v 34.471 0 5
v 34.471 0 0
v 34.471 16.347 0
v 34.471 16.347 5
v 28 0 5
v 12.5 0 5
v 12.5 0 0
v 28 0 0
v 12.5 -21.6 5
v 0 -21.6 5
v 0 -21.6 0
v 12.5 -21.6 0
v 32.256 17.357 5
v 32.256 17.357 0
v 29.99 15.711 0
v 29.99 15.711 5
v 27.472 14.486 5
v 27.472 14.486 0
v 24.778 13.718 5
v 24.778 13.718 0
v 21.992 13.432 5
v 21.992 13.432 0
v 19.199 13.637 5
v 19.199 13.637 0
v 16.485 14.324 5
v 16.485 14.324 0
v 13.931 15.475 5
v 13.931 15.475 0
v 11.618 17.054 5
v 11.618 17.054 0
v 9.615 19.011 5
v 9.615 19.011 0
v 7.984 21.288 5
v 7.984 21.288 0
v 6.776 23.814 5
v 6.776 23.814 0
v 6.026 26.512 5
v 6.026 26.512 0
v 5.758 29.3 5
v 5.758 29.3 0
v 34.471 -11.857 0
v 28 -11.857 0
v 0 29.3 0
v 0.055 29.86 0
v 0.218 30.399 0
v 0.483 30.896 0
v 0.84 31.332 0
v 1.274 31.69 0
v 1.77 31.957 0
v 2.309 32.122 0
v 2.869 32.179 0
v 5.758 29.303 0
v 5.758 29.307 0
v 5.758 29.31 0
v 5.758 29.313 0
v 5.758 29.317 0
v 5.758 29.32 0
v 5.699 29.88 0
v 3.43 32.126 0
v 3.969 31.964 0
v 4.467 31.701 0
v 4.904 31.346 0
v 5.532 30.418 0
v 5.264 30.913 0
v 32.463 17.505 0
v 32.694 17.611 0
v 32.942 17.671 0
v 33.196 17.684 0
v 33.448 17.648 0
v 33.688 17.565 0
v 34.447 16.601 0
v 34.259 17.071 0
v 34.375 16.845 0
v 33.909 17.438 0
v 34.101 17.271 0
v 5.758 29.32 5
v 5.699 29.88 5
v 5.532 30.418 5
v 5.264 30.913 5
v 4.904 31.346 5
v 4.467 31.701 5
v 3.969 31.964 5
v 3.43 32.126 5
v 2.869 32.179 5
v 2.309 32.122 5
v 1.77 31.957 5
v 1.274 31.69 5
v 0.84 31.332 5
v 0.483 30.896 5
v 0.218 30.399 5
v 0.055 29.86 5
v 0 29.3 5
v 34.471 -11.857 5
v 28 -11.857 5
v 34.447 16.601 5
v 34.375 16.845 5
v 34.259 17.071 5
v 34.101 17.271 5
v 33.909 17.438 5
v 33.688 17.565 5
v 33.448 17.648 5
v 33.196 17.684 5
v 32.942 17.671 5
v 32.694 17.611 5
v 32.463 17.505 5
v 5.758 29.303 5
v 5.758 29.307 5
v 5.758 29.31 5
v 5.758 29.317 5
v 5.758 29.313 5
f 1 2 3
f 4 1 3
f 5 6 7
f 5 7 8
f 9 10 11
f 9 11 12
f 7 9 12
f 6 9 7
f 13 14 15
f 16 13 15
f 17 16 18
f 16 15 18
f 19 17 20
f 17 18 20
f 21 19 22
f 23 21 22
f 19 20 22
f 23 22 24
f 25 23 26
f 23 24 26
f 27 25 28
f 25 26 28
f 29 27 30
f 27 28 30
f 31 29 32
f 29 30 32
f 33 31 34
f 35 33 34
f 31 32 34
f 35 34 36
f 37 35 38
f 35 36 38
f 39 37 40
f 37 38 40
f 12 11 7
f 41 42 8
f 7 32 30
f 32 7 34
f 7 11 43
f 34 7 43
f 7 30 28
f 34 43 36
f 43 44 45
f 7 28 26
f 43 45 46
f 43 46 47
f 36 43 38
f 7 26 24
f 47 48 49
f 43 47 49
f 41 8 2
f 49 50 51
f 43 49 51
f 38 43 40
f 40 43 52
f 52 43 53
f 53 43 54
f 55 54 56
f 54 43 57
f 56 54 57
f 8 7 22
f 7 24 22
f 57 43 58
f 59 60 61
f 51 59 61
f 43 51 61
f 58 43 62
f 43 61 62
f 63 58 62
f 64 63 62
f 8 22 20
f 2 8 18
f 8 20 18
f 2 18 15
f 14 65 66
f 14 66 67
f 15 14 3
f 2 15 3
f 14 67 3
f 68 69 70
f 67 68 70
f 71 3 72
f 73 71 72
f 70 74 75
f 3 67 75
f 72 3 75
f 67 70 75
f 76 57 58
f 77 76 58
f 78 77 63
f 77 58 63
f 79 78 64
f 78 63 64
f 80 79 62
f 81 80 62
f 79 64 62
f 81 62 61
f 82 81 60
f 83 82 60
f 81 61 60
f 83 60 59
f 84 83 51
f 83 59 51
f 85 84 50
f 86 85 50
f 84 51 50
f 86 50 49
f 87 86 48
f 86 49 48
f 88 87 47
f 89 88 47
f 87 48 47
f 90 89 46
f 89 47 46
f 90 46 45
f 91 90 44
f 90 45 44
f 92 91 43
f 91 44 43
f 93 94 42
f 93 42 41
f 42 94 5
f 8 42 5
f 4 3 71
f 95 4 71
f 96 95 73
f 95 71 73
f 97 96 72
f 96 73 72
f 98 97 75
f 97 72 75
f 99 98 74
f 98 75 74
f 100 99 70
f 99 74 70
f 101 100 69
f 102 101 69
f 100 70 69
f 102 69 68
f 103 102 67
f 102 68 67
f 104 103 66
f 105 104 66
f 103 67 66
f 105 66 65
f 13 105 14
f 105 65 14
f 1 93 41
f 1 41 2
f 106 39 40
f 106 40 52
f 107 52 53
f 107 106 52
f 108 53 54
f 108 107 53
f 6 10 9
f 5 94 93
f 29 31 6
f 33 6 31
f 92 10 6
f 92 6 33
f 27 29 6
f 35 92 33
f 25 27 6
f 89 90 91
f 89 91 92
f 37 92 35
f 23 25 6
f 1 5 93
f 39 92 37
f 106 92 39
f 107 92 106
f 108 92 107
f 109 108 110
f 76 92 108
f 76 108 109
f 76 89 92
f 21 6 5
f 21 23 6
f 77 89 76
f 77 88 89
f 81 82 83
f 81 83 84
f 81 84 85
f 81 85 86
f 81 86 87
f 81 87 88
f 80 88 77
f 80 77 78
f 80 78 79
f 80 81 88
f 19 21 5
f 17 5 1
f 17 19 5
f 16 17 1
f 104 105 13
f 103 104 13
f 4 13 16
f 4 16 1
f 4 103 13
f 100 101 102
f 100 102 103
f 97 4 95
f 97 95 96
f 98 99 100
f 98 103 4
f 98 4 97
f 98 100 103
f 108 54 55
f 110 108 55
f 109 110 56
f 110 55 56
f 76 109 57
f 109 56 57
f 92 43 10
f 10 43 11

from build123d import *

# Parameters (mm, degrees)
F1_DEPTH = 5
F2_W     = 6.4714387385
F2_H     = 11.8567999452
F2_W_2   = 12.5
F2_H_2   = 9.7434073687
F3_DEPTH = 5


# Not quite as in the source:
# - ends of sketch curves that miss each other by under 0.0002 mm in the source are joined
# - a feature names something its author has since deleted; it is built from what else it names


with BuildPart() as f1:
    # F0 (on Top) → F1 (new body)
    with BuildSketch(Plane.XY):
        with BuildLine():
            Line((0, 29.2999204248), (0, 0))
            Line((0, 0), (34.4714387385, 0))
            Line((34.4714387385, 0), (34.4714387385, 16.3473710418))
            ThreePointArc((34.4714387385, 16.3473710418), (32.5790927131, 15.1300794804), (32.2559916738, 17.3568210333))
            ThreePointArc((32.2559916738, 17.3568210333), (15.182844974, 14.8438668457), (5.7578901922, 29.2999210911))
            ThreePointArc((5.7578901922, 29.2999210911), (2.8789043427, 26.4210160822), (0, 29.2999204248))
        make_face()
        with BuildLine():
            ThreePointArc((5.7577396052, 29.3198639813), (2.8689325046, 32.1788074974), (0, 29.2999204248))
            ThreePointArc((0, 29.2999204248), (2.8789043427, 26.4210160822), (5.7578086853, 29.2999204248))
            ThreePointArc((5.7578086853, 29.2999204248), (5.7578117914, 29.3098925127), (5.7577396052, 29.3198639813))
        make_face()
        with BuildLine():
            ThreePointArc((32.2559916738, 17.3568210333), (32.5790927131, 15.1300794804), (34.4714387385, 16.3473710418))
            ThreePointArc((34.4714387385, 16.3473710418), (33.6883902233, 17.5646626032), (32.2559916738, 17.3568210333))
        make_face()
    extrude(amount=F1_DEPTH)

    # F2 (on face) → F3 (join)
    with BuildSketch(Plane.XY.offset(5)):
        with BuildLine():
            Line((28, 0), (34.4714387385, 0))
            Line((34.4714387385, 0), (34.4714387385, 16.3473710418))
            ThreePointArc((34.4714387385, 16.3473710418), (33.6883902233, 17.5646626032), (32.2559916738, 17.3568210333))
            ThreePointArc((32.2559916738, 17.3568210333), (15.182844974, 14.8438668457), (5.7578901922, 29.2999210911))
            ThreePointArc((5.7578901922, 29.2999210911), (5.757811792, 29.3098923335), (5.7577396052, 29.3198639813))
            ThreePointArc((5.7577396052, 29.3198639813), (2.8689325046, 32.1788074974), (0, 29.2999204248))
            Line((0, 29.2999204248), (0, 25.3991372883))
            Line((0, 25.3991372883), (0, 0))
            Line((0, 0), (12.5, 0))
            Line((12.5, 0), (28, 0))
        make_face()
        with Locations((31.2357193692, -5.9283999726)):
            Rectangle(F2_W, F2_H)
        with Locations((6.25, -5.9283999726)):
            Rectangle(F2_W_2, F2_H)
        with Locations((6.25, -16.7285036296)):
            Rectangle(F2_W_2, F2_H_2)
        with Locations((6.25, -5.9283999726)):
            Rectangle(F2_W_2, F2_H)
    extrude(amount=-F3_DEPTH)


solid = f1.part
